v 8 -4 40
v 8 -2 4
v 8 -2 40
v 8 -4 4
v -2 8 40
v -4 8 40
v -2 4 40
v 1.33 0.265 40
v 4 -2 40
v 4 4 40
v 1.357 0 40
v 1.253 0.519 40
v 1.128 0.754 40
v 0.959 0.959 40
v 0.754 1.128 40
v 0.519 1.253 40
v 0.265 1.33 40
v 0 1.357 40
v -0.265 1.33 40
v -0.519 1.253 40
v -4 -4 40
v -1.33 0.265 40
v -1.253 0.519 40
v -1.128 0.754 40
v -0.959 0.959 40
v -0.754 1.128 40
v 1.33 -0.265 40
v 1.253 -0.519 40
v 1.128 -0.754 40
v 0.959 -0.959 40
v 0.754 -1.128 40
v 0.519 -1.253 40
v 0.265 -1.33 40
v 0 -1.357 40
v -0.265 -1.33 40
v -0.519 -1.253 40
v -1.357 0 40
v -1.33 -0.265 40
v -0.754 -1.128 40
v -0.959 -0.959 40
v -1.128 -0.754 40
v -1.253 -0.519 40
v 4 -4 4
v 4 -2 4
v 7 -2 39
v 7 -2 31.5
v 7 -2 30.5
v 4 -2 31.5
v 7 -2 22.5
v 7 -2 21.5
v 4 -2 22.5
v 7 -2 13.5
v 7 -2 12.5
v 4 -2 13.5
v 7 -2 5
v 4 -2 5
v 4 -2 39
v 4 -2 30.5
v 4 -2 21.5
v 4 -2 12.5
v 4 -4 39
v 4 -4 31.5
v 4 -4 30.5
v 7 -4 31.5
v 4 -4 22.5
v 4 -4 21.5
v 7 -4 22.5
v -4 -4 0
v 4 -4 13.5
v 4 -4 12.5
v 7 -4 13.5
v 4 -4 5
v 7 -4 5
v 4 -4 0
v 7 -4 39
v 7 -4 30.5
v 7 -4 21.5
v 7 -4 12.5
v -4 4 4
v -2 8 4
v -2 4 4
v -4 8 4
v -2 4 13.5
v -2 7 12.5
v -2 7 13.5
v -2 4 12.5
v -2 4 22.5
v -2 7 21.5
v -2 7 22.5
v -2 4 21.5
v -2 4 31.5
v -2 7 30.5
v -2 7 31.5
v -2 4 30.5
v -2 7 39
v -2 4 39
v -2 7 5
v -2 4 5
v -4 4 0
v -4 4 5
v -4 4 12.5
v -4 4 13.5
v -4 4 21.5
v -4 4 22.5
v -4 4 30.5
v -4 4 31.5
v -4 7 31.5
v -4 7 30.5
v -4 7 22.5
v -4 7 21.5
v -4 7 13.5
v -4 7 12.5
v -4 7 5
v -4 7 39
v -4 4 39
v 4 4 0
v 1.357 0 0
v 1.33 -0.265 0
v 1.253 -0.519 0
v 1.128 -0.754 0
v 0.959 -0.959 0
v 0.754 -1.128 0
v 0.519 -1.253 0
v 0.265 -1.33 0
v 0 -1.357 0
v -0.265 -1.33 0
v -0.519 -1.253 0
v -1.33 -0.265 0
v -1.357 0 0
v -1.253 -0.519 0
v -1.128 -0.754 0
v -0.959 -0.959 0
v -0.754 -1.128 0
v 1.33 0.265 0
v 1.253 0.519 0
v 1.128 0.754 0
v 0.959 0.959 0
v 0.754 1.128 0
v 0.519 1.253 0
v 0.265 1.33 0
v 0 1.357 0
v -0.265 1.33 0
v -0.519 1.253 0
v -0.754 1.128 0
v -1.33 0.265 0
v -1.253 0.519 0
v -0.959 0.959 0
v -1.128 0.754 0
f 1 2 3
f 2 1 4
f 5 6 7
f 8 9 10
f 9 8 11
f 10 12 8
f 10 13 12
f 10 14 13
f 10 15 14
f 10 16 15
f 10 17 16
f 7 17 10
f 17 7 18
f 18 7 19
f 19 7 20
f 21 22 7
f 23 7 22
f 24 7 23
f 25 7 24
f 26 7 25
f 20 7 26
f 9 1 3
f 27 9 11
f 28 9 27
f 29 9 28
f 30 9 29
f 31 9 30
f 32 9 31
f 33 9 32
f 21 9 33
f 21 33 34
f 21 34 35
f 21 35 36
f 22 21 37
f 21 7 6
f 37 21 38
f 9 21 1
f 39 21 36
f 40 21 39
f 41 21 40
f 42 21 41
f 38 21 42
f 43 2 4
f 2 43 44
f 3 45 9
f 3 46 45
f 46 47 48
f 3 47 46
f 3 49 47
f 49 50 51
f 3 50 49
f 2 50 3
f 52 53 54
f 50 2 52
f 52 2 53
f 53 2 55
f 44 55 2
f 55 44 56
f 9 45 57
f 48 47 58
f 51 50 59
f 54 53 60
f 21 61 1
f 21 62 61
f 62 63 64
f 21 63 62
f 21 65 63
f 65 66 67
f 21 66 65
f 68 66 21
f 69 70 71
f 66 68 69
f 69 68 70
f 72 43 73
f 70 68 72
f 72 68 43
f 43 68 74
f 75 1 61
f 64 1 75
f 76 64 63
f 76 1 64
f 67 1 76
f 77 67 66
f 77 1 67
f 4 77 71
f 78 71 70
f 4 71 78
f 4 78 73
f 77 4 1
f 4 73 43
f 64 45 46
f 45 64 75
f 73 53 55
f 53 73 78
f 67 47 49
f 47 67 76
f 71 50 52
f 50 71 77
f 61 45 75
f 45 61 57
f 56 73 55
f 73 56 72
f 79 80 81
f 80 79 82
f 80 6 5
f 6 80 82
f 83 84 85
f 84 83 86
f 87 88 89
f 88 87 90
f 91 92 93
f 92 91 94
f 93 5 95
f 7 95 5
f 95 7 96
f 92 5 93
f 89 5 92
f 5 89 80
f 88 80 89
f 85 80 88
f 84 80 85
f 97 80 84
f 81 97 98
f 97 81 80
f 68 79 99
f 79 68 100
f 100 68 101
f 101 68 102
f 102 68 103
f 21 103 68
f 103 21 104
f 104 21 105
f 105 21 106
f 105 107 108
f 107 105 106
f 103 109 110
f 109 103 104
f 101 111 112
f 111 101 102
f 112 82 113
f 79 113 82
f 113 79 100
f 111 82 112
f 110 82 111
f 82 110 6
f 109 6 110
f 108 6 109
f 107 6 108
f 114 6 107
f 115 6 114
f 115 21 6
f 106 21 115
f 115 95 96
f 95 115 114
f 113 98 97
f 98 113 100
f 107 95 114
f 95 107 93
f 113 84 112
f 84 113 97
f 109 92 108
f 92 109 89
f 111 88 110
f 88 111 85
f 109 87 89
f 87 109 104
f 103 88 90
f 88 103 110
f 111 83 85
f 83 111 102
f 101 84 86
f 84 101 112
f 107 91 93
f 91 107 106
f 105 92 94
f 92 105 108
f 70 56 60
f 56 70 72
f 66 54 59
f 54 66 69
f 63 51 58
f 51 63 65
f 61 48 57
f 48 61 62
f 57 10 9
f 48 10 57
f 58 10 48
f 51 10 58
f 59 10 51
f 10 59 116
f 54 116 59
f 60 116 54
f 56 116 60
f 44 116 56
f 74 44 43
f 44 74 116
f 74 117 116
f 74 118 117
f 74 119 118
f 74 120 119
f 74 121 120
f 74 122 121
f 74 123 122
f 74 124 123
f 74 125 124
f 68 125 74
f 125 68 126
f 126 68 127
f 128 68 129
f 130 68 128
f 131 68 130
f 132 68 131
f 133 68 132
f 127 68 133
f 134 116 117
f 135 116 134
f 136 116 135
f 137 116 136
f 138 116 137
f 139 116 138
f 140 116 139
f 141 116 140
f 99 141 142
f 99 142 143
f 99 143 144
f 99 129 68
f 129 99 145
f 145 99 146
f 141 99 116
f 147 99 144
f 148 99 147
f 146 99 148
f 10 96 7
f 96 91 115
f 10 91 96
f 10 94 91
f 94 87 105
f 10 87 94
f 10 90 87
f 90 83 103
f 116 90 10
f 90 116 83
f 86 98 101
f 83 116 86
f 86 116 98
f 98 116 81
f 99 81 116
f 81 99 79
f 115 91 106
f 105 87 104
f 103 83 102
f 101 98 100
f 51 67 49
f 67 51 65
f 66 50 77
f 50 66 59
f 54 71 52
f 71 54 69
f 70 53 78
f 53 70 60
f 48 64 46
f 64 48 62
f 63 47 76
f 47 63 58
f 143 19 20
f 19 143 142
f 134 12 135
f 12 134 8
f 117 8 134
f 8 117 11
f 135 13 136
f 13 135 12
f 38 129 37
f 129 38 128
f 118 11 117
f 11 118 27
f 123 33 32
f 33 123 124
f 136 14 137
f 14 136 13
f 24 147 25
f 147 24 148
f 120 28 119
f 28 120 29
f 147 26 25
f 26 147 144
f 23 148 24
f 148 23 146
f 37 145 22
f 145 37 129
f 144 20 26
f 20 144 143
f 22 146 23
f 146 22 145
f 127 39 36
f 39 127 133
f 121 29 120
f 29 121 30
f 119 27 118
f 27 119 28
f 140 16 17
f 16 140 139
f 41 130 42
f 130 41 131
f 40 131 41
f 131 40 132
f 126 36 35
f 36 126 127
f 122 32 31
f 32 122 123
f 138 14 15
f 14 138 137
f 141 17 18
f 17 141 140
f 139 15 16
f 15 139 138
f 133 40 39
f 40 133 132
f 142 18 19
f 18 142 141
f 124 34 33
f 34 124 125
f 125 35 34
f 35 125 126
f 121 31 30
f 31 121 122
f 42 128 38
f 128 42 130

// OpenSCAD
// Title: ISO/DIN standard Screw Holes
// Author: Carlo Wood
// Date: 26/8/2016
// License: Creative Commons - Share Alike - Attribution

// Description: Screw holes come in many forms and sizes and are
// a recurring necessity. This library intends to provide an
// easy way to add holes to your projects for screws.

// Usage:
//
// include <screw_holes.scad>
// screw_hole_fn = 64;                // Optional. The default is 32.
//
// difference()
// {
//   draw_solid_object();
//   translate(screw_position)
//     rotate(screw_orientation)
//       screw_hole(iso_norm, metric, length, thread_length, fn);
// }
//
// For example,
//       screw_hole(DIN34811, M3, 20);
// or
//       screw_hole([8.4, 2.7, 90], M4, 20); // dk = 8.4, k = 2.7, a = 90.
//
// The default fn is set to the global 'screw_hole_fn', which can be optionally
// be changed after including screw_holes.scad.
//
// The default thread_length is 0, causing the length to be extended
// with screw_hole_length_extend (0.1 mm) to make sure we get through
// the solid object.
//
// The length INCLUDES the head height, even for cylinder-head screws,
// when the screw is to be sunken (the default).
//
//          ^         ___  ________
//          |        |   |       ^   ^
//          |        |   |       |   |-- thread_length - screw_hole_length_extend
//          |     *) /   \       | __v_
//         -+- - - -|     |--  --|--\_ screw_hole_length_extend
//          ^       |     |      |
//   solid  |       |     |      |-- length                      ^
//   object |       |     |      |                               | z-axis
//          |    ,--'     '--. --|--                             |
//         _v____|___________| __v__`head height (k)             |____ xy plane
//               '-----|-----' ----\_ screw_hole_height_extend
//                     |__ Center position of screw hole (origin)
//
// The origin of the screw hole is to be positioned onto the surface of the solid object.
// *) In the case that there is a narrower cylinder for the thread of the screw
// to be screwed into, the diameter of the shaft is reduced with a cone of 90 degrees
// in order to make it printable with the head at the bottom.
//

// Global variables.
screw_hole_fn = 32;                      // Number of segments for a full circle.
screw_hole_length_extend = 0.1;          // Extra length of the non-threaded part of the screw hole.
screw_hole_height_extend = 0.1;          // Extra distance the hole extends above the surface.
screw_hole_cylinderhead_spacing = 0.1;   // Extra radius of hole around screw head.
screw_hole_countersunk_delta = 0.2;      // Extra depth of countersunk screw hole.

// Metric index.
M1_6 = 0;
M2   = 1;
M2_5 = 2;
M3   = 3;
M3_5 = 4;
M4   = 5;
M5   = 6;
M6   = 7;
M8   = 8;
M10  = 9;

// ISO and DIN index.
// Cylinder head screws.
ISO4762 = 0; DIN912 = 0;        // Hexagon socket head cap screws.

// Metric countersunk screws.
screw_hole_begin_countersunk = 1;
DIN963 = 1;                     // Slotted countersunk head screws.
DIN965 = 1;                     // Cross-recessed countersunk flat head screws.
DIN34811 = 2;                   // Cross-recessed countersunk flat head plastic screws.
ISO2009 = 3;                    // Slotted countersunk flat head screws.
ISO7046 = 3;			// Cross-recessed countersunk flat head screws.
ISO14581 = 3;                   // Hexalobular socket countersunk head screws, nominal dk values.
ISO14581m = 4;                  // Hexalobular socket countersunk head screws, maximum dk values.
ISO10642 = 5;                   // Hexagon socket countersunk head screws.

///////////////////////////////////////////////////////////////////////////////
// Test case
$fn=100;
//include <screw_holes.scad>
  h=40;
  r=4;
  ry=r/2.;
  //cr=6;
difference()
{
  union(){
  translate([-0, -0, -0. + h/2])
      cube([2*r,2*r,h], center=true);
        translate([r-1,-r+1,h/2.+2])
      difference(){
      cube([2.5*r,ry,h-4], center=true);
      cube([2.5*r-2,ry,h-6], center=true);          
      }
            
    translate([r+2.5-1,-r+1,h*2/4.+2])
    cube([r+1,ry,1], center=true);
    translate([r+2.5-1,-r+1,h*1/4.+3])
    cube([r+1,ry,1], center=true);
    translate([r+2.5-1,-r+1,h*3/4.+1])
    cube([r+1,ry,1], center=true);

      rotate([0,0,270]){
        translate([-r+1, -r+1,h/2.+2])
      difference(){
      cube([2.5*r,ry,h-4], center=true);
      cube([2.5*r-2,ry,h-6], center=true);          
      }

    translate([-r-2.5+1,-r+1,h*2/4.+2])
    cube([r+1,ry,1], center=true);
    translate([-r-2.5+1,-r+1,h*1/4.+3])
    cube([r+1,ry,1], center=true);
    translate([-r-2.5+1,-r+1,h*3/4.+1])
    cube([r+1,ry,1], center=true);
  }
  }
// Drill a hole for a DIN965 M3 screw with 20 mm long, and 10 mm thread.
  translate([-0, -0, -0. - h/2])
  screw_hole(DIN965, M3, 2*h, 2*h);
    }



///////////////////////////////////////////////////////////////////////////////

// These values are just a random guess for now.
screw_hole_thread_depth = [
  // M1_6   M2     M2_5   M3     M3_5   M4     M5     M6     M8     M10
     0.08,  0.1,  0.125, 0.15,  0.175,  0.2,  0.25,   0.3,   0.4,   0.5
];

// Outer diameter of thread.
screw_hole_d = [
  // M1_6   M2     M2_5   M3     M3_5   M4     M5     M6     M8     M10
     1.6,   2,     2.5,   3,     3.5,   4,     5,     6,     8,     10
];

// dk : The max. outer diameter of screw head (the min. is a few tenth less).
// k  : The (max) height of the screw head.

// With thanks to http://www.globalfastener.com/ for making these values available to the public.
screw_standard = [

  // ISO 4762 / DIN 912
  [
  // M1_6   M2     M2_5   M3     M3_5   M4     M5     M6     M8     M10
   [ 3.0,   3.8,   4.5,   5.5,   6.0,   7.0,   8.5,  10.0,  13.0,  16.0 ], // dk
   [ 1.6,   2.0,   2.5,   3.0,   3.5,   4.0,   5.0,   6.0,   8.0,  10.0 ]  // k
  ],

  // DIN 963 / DIN 965
  [
  // M1_6   M2     M2_5   M3     M3_5   M4     M5     M6     M8     M10
   [ 3.0,   3.8,   4.7,   5.6,   6.5,   7.5,   9.2,  11.0,  14.5,  18.0 ], // dk
   [ 0.96,  1.2,   1.5,   1.65,  1.93,  2.2,   2.5,   3.0,   4.0,   5.0 ]  // k
  ],

  // DIN 34811
  [
  // M1_6   M2     M2_5   M3     M3_5   M4     M5     M6     M8     M10
   [-1,    -1,    -1,     5.5,  -1,     8.4,   9.3,  11.3,  15.8,  -1 ],  // dk
   [-1,    -1,    -1,     1.65, -1,     2.7,   2.7,   3.3,   4.65, -1 ]   // k
  ],

  // ISO 2009 / ISO 7046 / ISO 14581 (nominal dk values)
  [
  // M1_6   M2     M2_5   M3     M3_5   M4     M5     M6     M8     M10
   [ 3.0,   3.8,   4.7,   5.5,   7.3,   8.4,   9.3,  11.3,  15.8,  18.3 ], // dk
   [ 1.0,   1.2,   1.5,   1.65,  2.35,  2.7,   2.7,   3.3,   4.65,  5.0 ]  // k
  ],

  // ISO 14581 (max dk values)
  [
  // M1_6   M2     M2_5   M3     M3_5   M4     M5     M6     M8     M10
   [-1,     4.4,   5.5,   6.3,   8.2,   9.4,  10.5,  12.6,  17.3,  20.0 ], // dk
   [-1,     1.2,   1.5,   1.65,  2.35,  2.7,   2.7,   3.3,   4.65,  5.0 ]  // k
  ],

  // ISO 10642 (max dk values)
  [
  // M1_6   M2     M2_5   M3     M3_5   M4     M5     M6     M8     M10
   [-1,    -1,    -1,     6.72, -1,     8.96, 11.20, 13.44, 17.92, 22.40 ], // dk
   [-1,    -1,    -1,     1.86, -1,     2.48,  3.10,  3.72,  4.96,  6.20 ]  // k
  ],
];

// Index for screw parameters.
screw_hole_dk = 0;
screw_hole_k = 1;
screw_hole_a = 2;

// Draw a hole of fn segments that fits around a cylinder with radius.
module sh_cylinder_outer(height, radius, fn)
{
  fudge = 1 / cos(180 / fn);
  cylinder(h = height, r = radius * fudge, $fn = fn);
}

// Draw a cone of height, in fn segments, that at its top fits around a cylinder with radius.
module sh_cone_outer(height, radius, fn)
{
  fudge = 1 / cos(180 / fn);
  translate([0, 0, height / 2])
    cylinder(height, radius * fudge, 0, true, $fn = fn);
}

// The main module.
//
// iso: One of the global ISO* or DIN* constants defined above.
//      Or a two dimensional vector [dk, k] or a three dimensional vector [dk, k, a], where
//      dk: the diameter of the head of the screw.
//      k : the height of the head of the screw.
//      a : the angle of conic part of the countersunk head of the screw.
// m  : One of the global M* constants defined above.
// L  : The thickness of the object that the hole to go through (b must be zero),
//      or the depth of the hole (b should be larger than zero).
// b  : The length of the hole that needs to be narrower than the m value
//      for the purpose of tapping a screw thread into (or you might try to use
//      a self-tapping screw).
// fn : facet number.
// ext: Hole extension ABOVE the screw head (with the same width as the head).

module screw_hole(iso, m, L, b = 0, fn = screw_hole_fn, ext = 0)
{
  d = screw_hole_d[m];
  dk = (len(iso) > 1) ? iso[screw_hole_dk] : screw_standard[iso][screw_hole_dk][m];
  k = (len(iso) > 1) ? iso[screw_hole_k] :  screw_standard[iso][screw_hole_k][m];
  a = (len(iso) > 1) ? ((len(iso) == 2) ? 180 : iso[screw_hole_a])
                     : iso >= screw_hole_begin_countersunk ? 90 : 180;
  s = d - 2 * screw_hole_thread_depth[m];
  l = L - b;

  union()
  {
    // The thread.
    if (b > 0)
    {
      translate([0, 0, l])
	sh_cylinder_outer(b, s / 2, fn);
    }

    // Extend hole above screw head.
    if (ext > 0)
    {
      translate([0, 0, -ext])
	sh_cylinder_outer(ext, dk / 2, fn);
    }

    // The non-thread.
    sh_cylinder_outer(l + screw_hole_length_extend, d / 2, fn);

    // The transistion from non-thread to thread.
    if (b > 0)
    {
      intersection()
      {
	sh_cylinder_outer(l + b, d / 2, fn);
	// The transition between non-thread and thread:
	//    screw_hole_thread_depth[m]
	//           \
	//           . |   s   | .
	//           . |<----->| .   | b
	//           . |       | .   |
	// cone -->  ./_________\.  _v_
	//        _ /|___________|\ ___ -- screw_hole_length_extend
	//       /   |<--------->|.  ^
	// cone base |     d   h |.  | l
	//                  ------>
	//                   
	// The cone base must be d where it hits the non-thread part,
	// but we generate an overlap so that the cone base that
        // we need to draw is d + 2 * screw_hole_length_extend.
	// The height is therefore d / 2 + screw_hole_length_extend.
	h = d / 2 + screw_hole_length_extend;
	translate([0, 0, l])
	  sh_cone_outer(h, h, fn);
      }
    }

    // The head.
    //
    // Note that dk is increased with 2 * screw_hole_cylinderhead_spacing,
    // and k is increased with screw_hole_countersunk_delta if a < 180.
    if (a < 180)
    {
      // The dimensions of a countersunk head:
      //                     d
      //                   <--->
      //                  |  .  |    ____                             ___
      //                  | /a\ |      ^-- pk                          ^
      //    solid  |      |     |    __v_                              |
      //    object |     /       \     ^                               |ch
      //           |    /         \    |-- k                           |
      //          _v___|___________| __v__                             v
      //              /'-----------'\----\_ screw_hole_height_extend  ---
      //                <---dk----> 
      //              <-----cb------>
      // 
      // pk : distance to peak of cone.
      // ch : total cone height.
      // cb : cone base.

      tt = 2 * tan(a / 2);	// Ratio between base and height of cone.
      pk = d / tt;
      ch = pk + (k + screw_hole_countersunk_delta) + screw_hole_height_extend;
      cb = ch * tt;

      if (cb < dk)
        echo("WARNING: screw_hole(): inconsistent values in first parameter", iso);

      translate([0, 0, -screw_hole_height_extend])
	intersection()
	{
	  sh_cone_outer(ch, cb / 2, fn);
	  cylinder(ch, r = dk / 2 + screw_hole_cylinderhead_spacing, $fn = fn);
	}
    }
    else
    {
      translate([0, 0, -screw_hole_height_extend])
	sh_cylinder_outer(screw_hole_height_extend + k, dk / 2 + screw_hole_cylinderhead_spacing, fn);
    }
  }
}
